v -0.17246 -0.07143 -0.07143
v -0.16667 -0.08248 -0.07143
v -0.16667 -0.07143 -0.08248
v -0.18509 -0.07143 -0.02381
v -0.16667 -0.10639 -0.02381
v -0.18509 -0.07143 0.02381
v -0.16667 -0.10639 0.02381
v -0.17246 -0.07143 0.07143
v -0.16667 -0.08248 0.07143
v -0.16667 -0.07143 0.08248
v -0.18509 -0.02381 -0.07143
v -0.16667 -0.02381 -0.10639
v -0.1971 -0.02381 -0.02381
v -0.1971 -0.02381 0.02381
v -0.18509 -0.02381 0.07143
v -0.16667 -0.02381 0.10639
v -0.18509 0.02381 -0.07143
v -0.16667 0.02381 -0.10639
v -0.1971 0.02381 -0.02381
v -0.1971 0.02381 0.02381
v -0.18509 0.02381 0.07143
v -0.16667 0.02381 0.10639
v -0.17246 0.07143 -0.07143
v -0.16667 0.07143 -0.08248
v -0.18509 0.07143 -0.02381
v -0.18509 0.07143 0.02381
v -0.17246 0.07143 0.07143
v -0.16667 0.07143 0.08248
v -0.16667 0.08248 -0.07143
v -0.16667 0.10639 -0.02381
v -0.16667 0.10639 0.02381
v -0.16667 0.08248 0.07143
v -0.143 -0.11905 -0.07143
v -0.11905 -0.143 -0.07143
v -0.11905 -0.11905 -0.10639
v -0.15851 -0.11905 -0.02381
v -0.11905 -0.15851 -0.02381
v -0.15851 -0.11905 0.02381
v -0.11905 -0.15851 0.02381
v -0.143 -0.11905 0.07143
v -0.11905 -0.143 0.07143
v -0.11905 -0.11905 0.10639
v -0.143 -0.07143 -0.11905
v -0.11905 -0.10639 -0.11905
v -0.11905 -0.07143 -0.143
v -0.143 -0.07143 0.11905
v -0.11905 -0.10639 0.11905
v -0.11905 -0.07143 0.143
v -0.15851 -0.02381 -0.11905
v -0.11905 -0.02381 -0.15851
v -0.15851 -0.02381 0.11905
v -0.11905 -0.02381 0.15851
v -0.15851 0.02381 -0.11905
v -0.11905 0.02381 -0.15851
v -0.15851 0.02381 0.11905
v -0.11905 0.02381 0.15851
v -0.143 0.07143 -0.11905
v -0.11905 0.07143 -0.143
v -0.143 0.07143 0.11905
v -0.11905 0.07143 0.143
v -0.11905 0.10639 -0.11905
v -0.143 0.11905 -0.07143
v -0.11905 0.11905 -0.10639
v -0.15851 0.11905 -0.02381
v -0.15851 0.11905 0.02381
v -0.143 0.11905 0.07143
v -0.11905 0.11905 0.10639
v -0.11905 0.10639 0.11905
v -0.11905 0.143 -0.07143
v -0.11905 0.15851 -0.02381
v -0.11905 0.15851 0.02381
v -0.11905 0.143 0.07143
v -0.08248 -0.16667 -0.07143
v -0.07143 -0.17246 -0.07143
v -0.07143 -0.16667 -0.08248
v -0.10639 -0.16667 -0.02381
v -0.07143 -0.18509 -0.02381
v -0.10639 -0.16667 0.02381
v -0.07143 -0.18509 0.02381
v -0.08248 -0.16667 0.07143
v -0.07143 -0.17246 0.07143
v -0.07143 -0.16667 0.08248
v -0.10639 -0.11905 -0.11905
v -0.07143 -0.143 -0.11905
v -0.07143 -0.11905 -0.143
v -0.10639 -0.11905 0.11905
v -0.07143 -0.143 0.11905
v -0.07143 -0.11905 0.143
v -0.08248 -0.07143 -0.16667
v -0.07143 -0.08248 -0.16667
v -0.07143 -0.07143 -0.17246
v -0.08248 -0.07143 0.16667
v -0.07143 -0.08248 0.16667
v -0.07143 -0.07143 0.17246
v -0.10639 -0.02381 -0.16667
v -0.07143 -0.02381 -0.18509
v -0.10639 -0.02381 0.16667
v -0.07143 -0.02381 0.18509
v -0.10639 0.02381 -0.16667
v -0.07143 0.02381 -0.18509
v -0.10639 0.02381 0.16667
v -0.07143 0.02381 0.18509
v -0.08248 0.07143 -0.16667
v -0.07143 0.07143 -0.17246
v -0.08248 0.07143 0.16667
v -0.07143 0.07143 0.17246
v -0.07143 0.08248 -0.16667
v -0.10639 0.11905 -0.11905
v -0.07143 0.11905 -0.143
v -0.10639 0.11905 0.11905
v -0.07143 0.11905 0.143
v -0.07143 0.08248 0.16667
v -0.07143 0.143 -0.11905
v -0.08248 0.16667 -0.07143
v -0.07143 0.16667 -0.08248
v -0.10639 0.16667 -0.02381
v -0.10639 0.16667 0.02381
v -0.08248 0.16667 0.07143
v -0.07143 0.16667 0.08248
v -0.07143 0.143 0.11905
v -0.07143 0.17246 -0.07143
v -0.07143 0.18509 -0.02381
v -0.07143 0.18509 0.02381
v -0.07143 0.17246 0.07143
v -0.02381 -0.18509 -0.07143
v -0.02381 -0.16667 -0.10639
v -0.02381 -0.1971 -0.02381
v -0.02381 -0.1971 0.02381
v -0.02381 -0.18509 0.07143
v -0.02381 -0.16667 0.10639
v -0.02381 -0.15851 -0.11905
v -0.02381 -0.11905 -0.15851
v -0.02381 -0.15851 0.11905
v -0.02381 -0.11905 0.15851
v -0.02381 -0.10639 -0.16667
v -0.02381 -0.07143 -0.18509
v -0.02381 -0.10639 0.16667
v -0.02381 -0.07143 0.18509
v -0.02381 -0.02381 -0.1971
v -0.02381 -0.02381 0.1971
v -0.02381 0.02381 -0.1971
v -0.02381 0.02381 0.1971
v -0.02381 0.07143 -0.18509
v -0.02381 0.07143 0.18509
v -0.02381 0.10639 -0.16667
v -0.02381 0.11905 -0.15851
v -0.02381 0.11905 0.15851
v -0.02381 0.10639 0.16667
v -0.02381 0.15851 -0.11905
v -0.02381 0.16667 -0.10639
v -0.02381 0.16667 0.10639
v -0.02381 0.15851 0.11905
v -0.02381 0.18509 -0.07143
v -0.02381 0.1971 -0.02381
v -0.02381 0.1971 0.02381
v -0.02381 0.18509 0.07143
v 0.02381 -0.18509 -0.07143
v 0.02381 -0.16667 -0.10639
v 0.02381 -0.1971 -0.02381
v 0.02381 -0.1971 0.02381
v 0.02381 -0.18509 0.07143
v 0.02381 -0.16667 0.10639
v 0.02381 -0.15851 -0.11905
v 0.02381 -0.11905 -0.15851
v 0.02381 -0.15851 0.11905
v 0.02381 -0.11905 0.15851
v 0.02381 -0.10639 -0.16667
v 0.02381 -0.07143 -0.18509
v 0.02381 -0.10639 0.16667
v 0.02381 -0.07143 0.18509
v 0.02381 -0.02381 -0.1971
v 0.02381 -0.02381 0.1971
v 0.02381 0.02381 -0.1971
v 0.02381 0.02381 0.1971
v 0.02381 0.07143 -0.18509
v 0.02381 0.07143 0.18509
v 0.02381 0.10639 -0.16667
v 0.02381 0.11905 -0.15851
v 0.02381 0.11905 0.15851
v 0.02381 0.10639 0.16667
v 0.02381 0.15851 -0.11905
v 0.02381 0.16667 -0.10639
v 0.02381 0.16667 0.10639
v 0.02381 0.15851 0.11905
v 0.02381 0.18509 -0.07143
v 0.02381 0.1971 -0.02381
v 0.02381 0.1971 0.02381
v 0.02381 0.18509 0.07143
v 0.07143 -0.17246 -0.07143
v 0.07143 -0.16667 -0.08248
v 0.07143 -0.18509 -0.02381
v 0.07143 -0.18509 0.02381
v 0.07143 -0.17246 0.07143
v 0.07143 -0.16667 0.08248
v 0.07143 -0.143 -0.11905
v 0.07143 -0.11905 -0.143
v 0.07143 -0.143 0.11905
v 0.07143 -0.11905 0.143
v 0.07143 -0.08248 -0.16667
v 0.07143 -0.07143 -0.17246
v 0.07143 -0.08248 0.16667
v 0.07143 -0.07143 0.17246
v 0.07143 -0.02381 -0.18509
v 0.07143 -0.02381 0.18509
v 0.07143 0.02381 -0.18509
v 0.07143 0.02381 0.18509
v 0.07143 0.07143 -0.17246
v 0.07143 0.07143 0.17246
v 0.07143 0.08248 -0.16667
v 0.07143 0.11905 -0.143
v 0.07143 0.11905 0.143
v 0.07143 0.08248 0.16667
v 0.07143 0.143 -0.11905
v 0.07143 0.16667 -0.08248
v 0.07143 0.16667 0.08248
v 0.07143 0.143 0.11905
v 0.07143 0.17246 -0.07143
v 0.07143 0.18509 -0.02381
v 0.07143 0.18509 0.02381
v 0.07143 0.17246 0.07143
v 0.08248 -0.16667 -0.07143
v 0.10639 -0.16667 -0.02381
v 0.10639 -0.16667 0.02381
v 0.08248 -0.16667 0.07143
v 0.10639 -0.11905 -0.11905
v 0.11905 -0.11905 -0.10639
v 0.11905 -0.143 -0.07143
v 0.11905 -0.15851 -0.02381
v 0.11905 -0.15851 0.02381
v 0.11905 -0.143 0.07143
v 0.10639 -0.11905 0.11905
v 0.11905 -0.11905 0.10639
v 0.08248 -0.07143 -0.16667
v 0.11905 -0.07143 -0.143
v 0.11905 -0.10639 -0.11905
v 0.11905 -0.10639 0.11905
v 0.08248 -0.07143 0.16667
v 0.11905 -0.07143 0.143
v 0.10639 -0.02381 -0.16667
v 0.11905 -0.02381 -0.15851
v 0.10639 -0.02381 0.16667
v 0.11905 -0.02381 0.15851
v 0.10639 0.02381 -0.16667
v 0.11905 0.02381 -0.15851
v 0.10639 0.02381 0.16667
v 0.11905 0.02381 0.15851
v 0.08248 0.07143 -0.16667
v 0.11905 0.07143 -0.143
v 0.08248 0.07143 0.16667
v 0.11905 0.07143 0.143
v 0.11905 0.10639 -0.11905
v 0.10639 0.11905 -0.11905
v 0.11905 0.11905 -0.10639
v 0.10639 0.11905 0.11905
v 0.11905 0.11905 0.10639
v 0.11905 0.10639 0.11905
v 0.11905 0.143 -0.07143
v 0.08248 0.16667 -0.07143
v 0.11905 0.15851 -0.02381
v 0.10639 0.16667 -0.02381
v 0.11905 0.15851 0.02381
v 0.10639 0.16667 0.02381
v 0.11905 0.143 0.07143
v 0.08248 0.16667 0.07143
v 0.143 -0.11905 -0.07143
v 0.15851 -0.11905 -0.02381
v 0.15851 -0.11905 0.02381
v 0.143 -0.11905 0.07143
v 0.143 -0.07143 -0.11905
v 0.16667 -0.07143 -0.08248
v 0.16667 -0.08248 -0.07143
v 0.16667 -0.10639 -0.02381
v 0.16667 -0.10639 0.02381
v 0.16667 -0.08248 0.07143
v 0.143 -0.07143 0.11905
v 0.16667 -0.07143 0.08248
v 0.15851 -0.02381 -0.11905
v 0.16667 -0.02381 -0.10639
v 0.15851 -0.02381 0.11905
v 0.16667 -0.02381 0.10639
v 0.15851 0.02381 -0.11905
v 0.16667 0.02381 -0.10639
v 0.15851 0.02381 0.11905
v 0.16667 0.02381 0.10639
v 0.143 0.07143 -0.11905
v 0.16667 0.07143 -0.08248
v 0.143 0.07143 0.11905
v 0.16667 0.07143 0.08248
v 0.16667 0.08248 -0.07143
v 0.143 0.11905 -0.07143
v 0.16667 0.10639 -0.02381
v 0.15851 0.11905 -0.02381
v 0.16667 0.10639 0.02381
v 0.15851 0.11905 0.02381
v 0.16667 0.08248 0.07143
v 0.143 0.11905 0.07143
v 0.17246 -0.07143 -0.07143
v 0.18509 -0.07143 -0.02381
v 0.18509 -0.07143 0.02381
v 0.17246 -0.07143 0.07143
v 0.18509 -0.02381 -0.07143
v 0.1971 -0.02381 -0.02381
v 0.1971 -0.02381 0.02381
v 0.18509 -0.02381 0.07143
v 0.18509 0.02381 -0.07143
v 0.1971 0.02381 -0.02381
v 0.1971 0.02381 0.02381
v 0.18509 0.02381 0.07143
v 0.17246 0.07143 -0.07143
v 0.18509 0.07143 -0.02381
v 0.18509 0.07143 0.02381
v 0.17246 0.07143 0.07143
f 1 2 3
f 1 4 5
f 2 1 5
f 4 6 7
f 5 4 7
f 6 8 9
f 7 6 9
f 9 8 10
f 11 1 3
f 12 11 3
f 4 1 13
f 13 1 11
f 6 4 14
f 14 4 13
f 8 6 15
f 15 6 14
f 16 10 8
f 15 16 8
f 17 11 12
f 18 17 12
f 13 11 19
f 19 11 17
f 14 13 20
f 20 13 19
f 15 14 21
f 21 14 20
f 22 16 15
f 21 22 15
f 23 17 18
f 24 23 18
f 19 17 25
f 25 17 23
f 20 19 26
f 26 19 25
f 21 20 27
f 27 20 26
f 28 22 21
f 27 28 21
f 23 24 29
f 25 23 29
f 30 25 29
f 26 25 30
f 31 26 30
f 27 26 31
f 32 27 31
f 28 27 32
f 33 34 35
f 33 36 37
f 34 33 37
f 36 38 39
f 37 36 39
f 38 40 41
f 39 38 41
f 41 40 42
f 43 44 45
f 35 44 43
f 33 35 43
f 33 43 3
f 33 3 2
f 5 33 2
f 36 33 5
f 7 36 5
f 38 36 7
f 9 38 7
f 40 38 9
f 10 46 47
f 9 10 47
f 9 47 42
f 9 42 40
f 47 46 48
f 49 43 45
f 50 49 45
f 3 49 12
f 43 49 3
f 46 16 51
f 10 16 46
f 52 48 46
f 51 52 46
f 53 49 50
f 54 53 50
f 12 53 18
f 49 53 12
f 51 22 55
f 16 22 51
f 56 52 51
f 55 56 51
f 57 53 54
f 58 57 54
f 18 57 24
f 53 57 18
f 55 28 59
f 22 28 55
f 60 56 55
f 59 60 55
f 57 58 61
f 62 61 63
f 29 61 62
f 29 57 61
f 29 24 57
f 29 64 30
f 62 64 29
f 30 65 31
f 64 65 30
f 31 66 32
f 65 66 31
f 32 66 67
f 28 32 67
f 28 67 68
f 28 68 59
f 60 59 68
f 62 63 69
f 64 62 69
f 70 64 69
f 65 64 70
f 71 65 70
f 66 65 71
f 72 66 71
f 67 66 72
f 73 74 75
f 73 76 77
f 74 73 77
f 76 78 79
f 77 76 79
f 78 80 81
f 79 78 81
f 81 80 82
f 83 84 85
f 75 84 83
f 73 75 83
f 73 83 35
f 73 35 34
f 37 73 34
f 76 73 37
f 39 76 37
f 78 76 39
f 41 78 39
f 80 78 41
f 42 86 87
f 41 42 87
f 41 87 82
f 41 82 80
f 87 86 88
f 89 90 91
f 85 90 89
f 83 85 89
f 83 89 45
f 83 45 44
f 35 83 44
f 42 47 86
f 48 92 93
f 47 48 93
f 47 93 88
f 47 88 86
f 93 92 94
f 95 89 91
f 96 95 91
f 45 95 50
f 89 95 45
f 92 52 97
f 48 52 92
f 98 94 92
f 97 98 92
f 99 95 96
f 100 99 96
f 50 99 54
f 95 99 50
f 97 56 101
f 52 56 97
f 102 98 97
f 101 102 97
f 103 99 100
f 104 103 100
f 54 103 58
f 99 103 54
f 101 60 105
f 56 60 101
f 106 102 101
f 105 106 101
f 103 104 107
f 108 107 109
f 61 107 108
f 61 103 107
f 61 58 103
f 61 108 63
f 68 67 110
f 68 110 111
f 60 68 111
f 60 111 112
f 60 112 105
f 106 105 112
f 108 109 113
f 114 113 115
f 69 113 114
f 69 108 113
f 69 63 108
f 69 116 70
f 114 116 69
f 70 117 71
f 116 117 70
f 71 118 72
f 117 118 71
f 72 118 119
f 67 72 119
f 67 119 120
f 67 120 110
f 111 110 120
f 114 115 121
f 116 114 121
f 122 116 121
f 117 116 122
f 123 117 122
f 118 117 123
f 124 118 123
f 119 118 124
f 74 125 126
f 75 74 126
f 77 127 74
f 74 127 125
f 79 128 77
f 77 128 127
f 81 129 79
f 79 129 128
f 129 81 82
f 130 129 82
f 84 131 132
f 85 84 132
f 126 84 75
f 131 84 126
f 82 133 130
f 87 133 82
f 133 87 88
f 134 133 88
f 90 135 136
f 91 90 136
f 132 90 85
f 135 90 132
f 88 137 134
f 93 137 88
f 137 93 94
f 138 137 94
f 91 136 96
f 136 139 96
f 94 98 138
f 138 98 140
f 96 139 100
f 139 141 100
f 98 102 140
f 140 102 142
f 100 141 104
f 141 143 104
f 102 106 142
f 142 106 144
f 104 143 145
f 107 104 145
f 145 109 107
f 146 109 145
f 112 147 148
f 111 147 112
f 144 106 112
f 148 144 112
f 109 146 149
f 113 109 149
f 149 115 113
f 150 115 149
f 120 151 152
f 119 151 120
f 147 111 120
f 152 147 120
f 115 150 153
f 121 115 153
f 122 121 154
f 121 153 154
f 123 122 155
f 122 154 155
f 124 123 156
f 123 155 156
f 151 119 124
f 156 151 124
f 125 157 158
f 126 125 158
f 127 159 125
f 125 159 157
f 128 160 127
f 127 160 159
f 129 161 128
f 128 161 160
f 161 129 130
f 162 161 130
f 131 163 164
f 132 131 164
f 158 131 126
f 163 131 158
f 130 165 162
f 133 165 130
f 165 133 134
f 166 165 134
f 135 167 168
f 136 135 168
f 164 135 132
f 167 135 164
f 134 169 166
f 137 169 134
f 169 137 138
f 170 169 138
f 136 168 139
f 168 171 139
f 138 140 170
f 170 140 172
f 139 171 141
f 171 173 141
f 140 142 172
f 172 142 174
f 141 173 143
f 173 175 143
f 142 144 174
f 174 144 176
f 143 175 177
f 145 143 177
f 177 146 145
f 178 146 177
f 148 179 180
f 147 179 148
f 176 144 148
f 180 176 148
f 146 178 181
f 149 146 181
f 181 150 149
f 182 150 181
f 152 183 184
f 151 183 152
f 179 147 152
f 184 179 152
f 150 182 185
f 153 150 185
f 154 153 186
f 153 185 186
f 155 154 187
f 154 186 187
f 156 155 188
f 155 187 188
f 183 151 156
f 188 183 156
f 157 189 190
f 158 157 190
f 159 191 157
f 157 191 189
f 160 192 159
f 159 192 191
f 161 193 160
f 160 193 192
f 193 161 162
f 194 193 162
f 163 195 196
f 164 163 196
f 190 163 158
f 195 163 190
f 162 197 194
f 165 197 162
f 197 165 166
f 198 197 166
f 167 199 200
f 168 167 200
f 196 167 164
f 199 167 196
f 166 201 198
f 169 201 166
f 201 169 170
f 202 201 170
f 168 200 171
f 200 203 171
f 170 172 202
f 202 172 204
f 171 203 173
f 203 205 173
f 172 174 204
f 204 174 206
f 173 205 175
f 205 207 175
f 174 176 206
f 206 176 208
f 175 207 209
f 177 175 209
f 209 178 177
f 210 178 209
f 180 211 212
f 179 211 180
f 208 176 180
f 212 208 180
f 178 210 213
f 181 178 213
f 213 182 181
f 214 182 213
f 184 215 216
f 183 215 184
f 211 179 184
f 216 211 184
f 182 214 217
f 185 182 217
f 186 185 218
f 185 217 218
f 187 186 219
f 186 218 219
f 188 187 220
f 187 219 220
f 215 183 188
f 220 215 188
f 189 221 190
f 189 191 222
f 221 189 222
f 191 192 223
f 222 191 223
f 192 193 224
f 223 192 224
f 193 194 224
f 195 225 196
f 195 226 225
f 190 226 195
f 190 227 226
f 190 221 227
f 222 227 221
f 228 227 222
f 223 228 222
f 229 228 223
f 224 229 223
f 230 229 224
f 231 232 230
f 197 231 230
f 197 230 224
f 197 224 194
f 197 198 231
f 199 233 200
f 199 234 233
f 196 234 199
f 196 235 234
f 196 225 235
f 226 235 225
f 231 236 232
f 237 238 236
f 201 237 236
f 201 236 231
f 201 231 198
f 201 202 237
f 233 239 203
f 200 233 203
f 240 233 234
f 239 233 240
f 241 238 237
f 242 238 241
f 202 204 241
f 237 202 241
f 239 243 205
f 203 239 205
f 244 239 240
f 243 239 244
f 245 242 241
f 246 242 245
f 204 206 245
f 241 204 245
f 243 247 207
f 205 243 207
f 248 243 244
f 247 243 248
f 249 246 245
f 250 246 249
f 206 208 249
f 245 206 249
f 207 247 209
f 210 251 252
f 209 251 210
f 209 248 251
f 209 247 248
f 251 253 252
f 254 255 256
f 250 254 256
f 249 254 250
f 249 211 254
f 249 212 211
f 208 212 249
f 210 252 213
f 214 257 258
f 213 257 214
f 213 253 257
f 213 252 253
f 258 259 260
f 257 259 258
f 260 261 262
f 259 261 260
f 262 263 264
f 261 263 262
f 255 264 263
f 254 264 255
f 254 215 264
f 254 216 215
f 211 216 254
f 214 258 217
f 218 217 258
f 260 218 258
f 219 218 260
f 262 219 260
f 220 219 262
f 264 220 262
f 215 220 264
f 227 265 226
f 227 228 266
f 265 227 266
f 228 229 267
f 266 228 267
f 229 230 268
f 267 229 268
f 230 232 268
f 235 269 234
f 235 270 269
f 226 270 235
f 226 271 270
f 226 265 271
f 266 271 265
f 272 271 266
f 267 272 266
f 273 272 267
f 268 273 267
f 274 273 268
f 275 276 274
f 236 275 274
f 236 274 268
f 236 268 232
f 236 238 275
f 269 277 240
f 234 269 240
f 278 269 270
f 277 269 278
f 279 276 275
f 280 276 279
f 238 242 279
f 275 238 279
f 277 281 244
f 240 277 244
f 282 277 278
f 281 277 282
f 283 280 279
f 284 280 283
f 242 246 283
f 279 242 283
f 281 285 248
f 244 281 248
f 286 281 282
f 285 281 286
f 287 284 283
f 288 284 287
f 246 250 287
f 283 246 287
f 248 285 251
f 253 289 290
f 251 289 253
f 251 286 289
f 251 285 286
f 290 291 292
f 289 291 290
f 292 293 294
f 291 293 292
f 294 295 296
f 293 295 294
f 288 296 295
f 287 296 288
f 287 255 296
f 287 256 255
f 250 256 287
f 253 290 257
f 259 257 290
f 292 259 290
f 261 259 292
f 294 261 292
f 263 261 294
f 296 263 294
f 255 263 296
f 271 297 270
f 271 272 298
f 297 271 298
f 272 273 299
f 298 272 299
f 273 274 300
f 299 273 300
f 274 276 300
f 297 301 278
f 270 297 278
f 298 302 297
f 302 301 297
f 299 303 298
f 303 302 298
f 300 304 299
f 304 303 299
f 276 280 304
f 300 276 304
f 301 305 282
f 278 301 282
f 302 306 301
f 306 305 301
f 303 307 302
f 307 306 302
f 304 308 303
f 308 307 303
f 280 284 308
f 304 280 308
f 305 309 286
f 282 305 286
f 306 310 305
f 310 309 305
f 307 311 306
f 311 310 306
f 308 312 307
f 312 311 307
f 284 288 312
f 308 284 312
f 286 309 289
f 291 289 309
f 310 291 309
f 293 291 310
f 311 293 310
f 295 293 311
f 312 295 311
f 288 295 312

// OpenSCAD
polyhedron(points=[
[-0.1724593752906436,-0.07142857142857162,-0.07142857142857162],
[-0.16666666666666674,-0.08247766040620363,-0.07142857142857162],
[-0.16666666666666674,-0.07142857142857162,-0.08247766040620363],
[-0.18508783976236987,-0.07142857142857162,-0.023809523809523947],
[-0.16666666666666674,-0.10639009021577395,-0.023809523809523947],
[-0.18508783976236987,-0.07142857142857162,0.023809523809523725],
[-0.16666666666666674,-0.10639009021577395,0.023809523809523725],
[-0.1724593752906436,-0.07142857142857162,0.0714285714285714],
[-0.16666666666666674,-0.08247766040620363,0.0714285714285714],
[-0.16666666666666674,-0.07142857142857162,0.08247756958007812],
[-0.18508783976236987,-0.023809523809523947,-0.07142857142857162],
[-0.16666666666666674,-0.023809523809523947,-0.10639009021577395],
[-0.1971043178013394,-0.023809523809523947,-0.023809523809523947],
[-0.1971043178013394,-0.023809523809523947,0.023809523809523725],
[-0.18508783976236987,-0.023809523809523947,0.0714285714285714],
[-0.16666666666666674,-0.023809523809523947,0.10639009021577372],
[-0.18508783976236987,0.023809523809523725,-0.07142857142857162],
[-0.16666666666666674,0.023809523809523725,-0.10639009021577395],
[-0.1971043178013394,0.023809523809523725,-0.023809523809523947],
[-0.1971043178013394,0.023809523809523725,0.023809523809523725],
[-0.18508783976236987,0.023809523809523725,0.0714285714285714],
[-0.16666666666666674,0.023809523809523725,0.10639009021577372],
[-0.1724593752906436,0.0714285714285714,-0.07142857142857162],
[-0.16666666666666674,0.0714285714285714,-0.08247766040620363],
[-0.18508783976236987,0.0714285714285714,-0.023809523809523947],
[-0.18508783976236987,0.0714285714285714,0.023809523809523725],
[-0.1724593752906436,0.0714285714285714,0.0714285714285714],
[-0.16666666666666674,0.0714285714285714,0.08247756958007812],
[-0.16666666666666674,0.08247756958007812,-0.07142857142857162],
[-0.16666666666666674,0.10639009021577372,-0.023809523809523947],
[-0.16666666666666674,0.10639009021577372,0.023809523809523725],
[-0.16666666666666674,0.08247756958007812,0.0714285714285714],
[-0.14299737839471738,-0.11904761904761907,-0.07142857142857162],
[-0.11904761904761907,-0.14299737839471738,-0.07142857142857162],
[-0.11904761904761907,-0.11904761904761907,-0.10639009021577395],
[-0.15850702921549487,-0.11904761904761907,-0.023809523809523947],
[-0.11904761904761907,-0.15850702921549487,-0.023809523809523947],
[-0.15850702921549487,-0.11904761904761907,0.023809523809523725],
[-0.11904761904761907,-0.15850702921549487,0.023809523809523725],
[-0.14299737839471738,-0.11904761904761907,0.0714285714285714],
[-0.11904761904761907,-0.14299737839471738,0.0714285714285714],
[-0.11904761904761907,-0.11904761904761907,0.10639009021577372],
[-0.14299737839471738,-0.07142857142857162,-0.11904761904761907],
[-0.11904761904761907,-0.10639009021577395,-0.11904761904761907],
[-0.11904761904761907,-0.07142857142857162,-0.14299737839471738],
[-0.14299737839471738,-0.07142857142857162,0.11904761904761907],
[-0.11904761904761907,-0.10639009021577395,0.11904761904761907],
[-0.11904761904761907,-0.07142857142857162,0.14299737839471716],
[-0.15850702921549487,-0.023809523809523947,-0.11904761904761907],
[-0.11904761904761907,-0.023809523809523947,-0.15850702921549487],
[-0.15850702921549487,-0.023809523809523947,0.11904761904761907],
[-0.11904761904761907,-0.023809523809523947,0.15850702921549464],
[-0.15850702921549487,0.023809523809523725,-0.11904761904761907],
[-0.11904761904761907,0.023809523809523725,-0.15850702921549487],
[-0.15850702921549487,0.023809523809523725,0.11904761904761907],
[-0.11904761904761907,0.023809523809523725,0.15850702921549464],
[-0.14299737839471738,0.0714285714285714,-0.11904761904761907],
[-0.11904761904761907,0.0714285714285714,-0.14299737839471738],
[-0.14299737839471738,0.0714285714285714,0.11904761904761907],
[-0.11904761904761907,0.0714285714285714,0.14299737839471716],
[-0.11904761904761907,0.10639009021577372,-0.11904761904761907],
[-0.14299737839471738,0.11904761904761907,-0.07142857142857162],
[-0.11904761904761907,0.11904761904761907,-0.10639009021577395],
[-0.15850702921549487,0.11904761904761907,-0.023809523809523947],
[-0.15850702921549487,0.11904761904761907,0.023809523809523725],
[-0.14299737839471738,0.11904761904761907,0.0714285714285714],
[-0.11904761904761907,0.11904761904761907,0.10639009021577372],
[-0.11904761904761907,0.10639009021577372,0.11904761904761907],
[-0.11904761904761907,0.14299737839471716,-0.07142857142857162],
[-0.11904761904761907,0.15850702921549464,-0.023809523809523947],
[-0.11904761904761907,0.15850702921549464,0.023809523809523725],
[-0.11904761904761907,0.14299737839471716,0.0714285714285714],
[-0.08247766040620363,-0.16666666666666674,-0.07142857142857162],
[-0.07142857142857162,-0.1724593752906436,-0.07142857142857162],
[-0.07142857142857162,-0.16666666666666674,-0.08247766040620363],
[-0.10639009021577395,-0.16666666666666674,-0.023809523809523947],
[-0.07142857142857162,-0.18508783976236987,-0.023809523809523947],
[-0.10639009021577395,-0.16666666666666674,0.023809523809523725],
[-0.07142857142857162,-0.18508783976236987,0.023809523809523725],
[-0.08247766040620363,-0.16666666666666674,0.0714285714285714],
[-0.07142857142857162,-0.1724593752906436,0.0714285714285714],
[-0.07142857142857162,-0.16666666666666674,0.08247756958007812],
[-0.10639009021577395,-0.11904761904761907,-0.11904761904761907],
[-0.07142857142857162,-0.14299737839471738,-0.11904761904761907],
[-0.07142857142857162,-0.11904761904761907,-0.14299737839471738],
[-0.10639009021577395,-0.11904761904761907,0.11904761904761907],
[-0.07142857142857162,-0.14299737839471738,0.11904761904761907],
[-0.07142857142857162,-0.11904761904761907,0.14299737839471716],
[-0.08247766040620363,-0.07142857142857162,-0.16666666666666674],
[-0.07142857142857162,-0.08247766040620363,-0.16666666666666674],
[-0.07142857142857162,-0.07142857142857162,-0.1724593752906436],
[-0.08247766040620363,-0.07142857142857162,0.16666666666666652],
[-0.07142857142857162,-0.08247766040620363,0.16666666666666652],
[-0.07142857142857162,-0.07142857142857162,0.1724593752906436],
[-0.10639009021577395,-0.023809523809523947,-0.16666666666666674],
[-0.07142857142857162,-0.023809523809523947,-0.18508783976236987],
[-0.10639009021577395,-0.023809523809523947,0.16666666666666652],
[-0.07142857142857162,-0.023809523809523947,0.18508783976236964],
[-0.10639009021577395,0.023809523809523725,-0.16666666666666674],
[-0.07142857142857162,0.023809523809523725,-0.18508783976236987],
[-0.10639009021577395,0.023809523809523725,0.16666666666666652],
[-0.07142857142857162,0.023809523809523725,0.18508783976236964],
[-0.08247766040620363,0.0714285714285714,-0.16666666666666674],
[-0.07142857142857162,0.0714285714285714,-0.1724593752906436],
[-0.08247766040620363,0.0714285714285714,0.16666666666666652],
[-0.07142857142857162,0.0714285714285714,0.1724593752906436],
[-0.07142857142857162,0.08247756958007812,-0.16666666666666674],
[-0.10639009021577395,0.11904761904761907,-0.11904761904761907],
[-0.07142857142857162,0.11904761904761907,-0.14299737839471738],
[-0.10639009021577395,0.11904761904761907,0.11904761904761907],
[-0.07142857142857162,0.11904761904761907,0.14299737839471716],
[-0.07142857142857162,0.08247756958007812,0.16666666666666652],
[-0.07142857142857162,0.14299737839471716,-0.11904761904761907],
[-0.08247766040620363,0.16666666666666652,-0.07142857142857162],
[-0.07142857142857162,0.16666666666666652,-0.08247766040620363],
[-0.10639009021577395,0.16666666666666652,-0.023809523809523947],
[-0.10639009021577395,0.16666666666666652,0.023809523809523725],
[-0.08247766040620363,0.16666666666666652,0.0714285714285714],
[-0.07142857142857162,0.16666666666666652,0.08247756958007812],
[-0.07142857142857162,0.14299737839471716,0.11904761904761907],
[-0.07142857142857162,0.1724593752906436,-0.07142857142857162],
[-0.07142857142857162,0.18508783976236964,-0.023809523809523947],
[-0.07142857142857162,0.18508783976236964,0.023809523809523725],
[-0.07142857142857162,0.1724593752906436,0.0714285714285714],
[-0.023809523809523947,-0.18508783976236987,-0.07142857142857162],
[-0.023809523809523947,-0.16666666666666674,-0.10639009021577395],
[-0.023809523809523947,-0.1971043178013394,-0.023809523809523947],
[-0.023809523809523947,-0.1971043178013394,0.023809523809523725],
[-0.023809523809523947,-0.18508783976236987,0.0714285714285714],
[-0.023809523809523947,-0.16666666666666674,0.10639009021577372],
[-0.023809523809523947,-0.15850702921549487,-0.11904761904761907],
[-0.023809523809523947,-0.11904761904761907,-0.15850702921549487],
[-0.023809523809523947,-0.15850702921549487,0.11904761904761907],
[-0.023809523809523947,-0.11904761904761907,0.15850702921549464],
[-0.023809523809523947,-0.10639009021577395,-0.16666666666666674],
[-0.023809523809523947,-0.07142857142857162,-0.18508783976236987],
[-0.023809523809523947,-0.10639009021577395,0.16666666666666652],
[-0.023809523809523947,-0.07142857142857162,0.18508783976236964],
[-0.023809523809523947,-0.023809523809523947,-0.1971043178013394],
[-0.023809523809523947,-0.023809523809523947,0.1971043178013392],
[-0.023809523809523947,0.023809523809523725,-0.1971043178013394],
[-0.023809523809523947,0.023809523809523725,0.1971043178013392],
[-0.023809523809523947,0.0714285714285714,-0.18508783976236987],
[-0.023809523809523947,0.0714285714285714,0.18508783976236964],
[-0.023809523809523947,0.10639009021577372,-0.16666666666666674],
[-0.023809523809523947,0.11904761904761907,-0.15850702921549487],
[-0.023809523809523947,0.11904761904761907,0.15850702921549464],
[-0.023809523809523947,0.10639009021577372,0.16666666666666652],
[-0.023809523809523947,0.15850702921549464,-0.11904761904761907],
[-0.023809523809523947,0.16666666666666652,-0.10639009021577395],
[-0.023809523809523947,0.16666666666666652,0.10639009021577372],
[-0.023809523809523947,0.15850702921549464,0.11904761904761907],
[-0.023809523809523947,0.18508783976236964,-0.07142857142857162],
[-0.023809523809523947,0.1971043178013392,-0.023809523809523947],
[-0.023809523809523947,0.1971043178013392,0.023809523809523725],
[-0.023809523809523947,0.18508783976236964,0.0714285714285714],
[0.023809523809523725,-0.18508783976236987,-0.07142857142857162],
[0.023809523809523725,-0.16666666666666674,-0.10639009021577395],
[0.023809523809523725,-0.1971043178013394,-0.023809523809523947],
[0.023809523809523725,-0.1971043178013394,0.023809523809523725],
[0.023809523809523725,-0.18508783976236987,0.0714285714285714],
[0.023809523809523725,-0.16666666666666674,0.10639009021577372],
[0.023809523809523725,-0.15850702921549487,-0.11904761904761907],
[0.023809523809523725,-0.11904761904761907,-0.15850702921549487],
[0.023809523809523725,-0.15850702921549487,0.11904761904761907],
[0.023809523809523725,-0.11904761904761907,0.15850702921549464],
[0.023809523809523725,-0.10639009021577395,-0.16666666666666674],
[0.023809523809523725,-0.07142857142857162,-0.18508783976236987],
[0.023809523809523725,-0.10639009021577395,0.16666666666666652],
[0.023809523809523725,-0.07142857142857162,0.18508783976236964],
[0.023809523809523725,-0.023809523809523947,-0.1971043178013394],
[0.023809523809523725,-0.023809523809523947,0.1971043178013392],
[0.023809523809523725,0.023809523809523725,-0.1971043178013394],
[0.023809523809523725,0.023809523809523725,0.1971043178013392],
[0.023809523809523725,0.0714285714285714,-0.18508783976236987],
[0.023809523809523725,0.0714285714285714,0.18508783976236964],
[0.023809523809523725,0.10639009021577372,-0.16666666666666674],
[0.023809523809523725,0.11904761904761907,-0.15850702921549487],
[0.023809523809523725,0.11904761904761907,0.15850702921549464],
[0.023809523809523725,0.10639009021577372,0.16666666666666652],
[0.023809523809523725,0.15850702921549464,-0.11904761904761907],
[0.023809523809523725,0.16666666666666652,-0.10639009021577395],
[0.023809523809523725,0.16666666666666652,0.10639009021577372],
[0.023809523809523725,0.15850702921549464,0.11904761904761907],
[0.023809523809523725,0.18508783976236964,-0.07142857142857162],
[0.023809523809523725,0.1971043178013392,-0.023809523809523947],
[0.023809523809523725,0.1971043178013392,0.023809523809523725],
[0.023809523809523725,0.18508783976236964,0.0714285714285714],
[0.0714285714285714,-0.1724593752906436,-0.07142857142857162],
[0.0714285714285714,-0.16666666666666674,-0.08247766040620363],
[0.0714285714285714,-0.18508783976236987,-0.023809523809523947],
[0.0714285714285714,-0.18508783976236987,0.023809523809523725],
[0.0714285714285714,-0.1724593752906436,0.0714285714285714],
[0.0714285714285714,-0.16666666666666674,0.08247756958007812],
[0.0714285714285714,-0.14299737839471738,-0.11904761904761907],
[0.0714285714285714,-0.11904761904761907,-0.14299737839471738],
[0.0714285714285714,-0.14299737839471738,0.11904761904761907],
[0.0714285714285714,-0.11904761904761907,0.14299737839471716],
[0.0714285714285714,-0.08247766040620363,-0.16666666666666674],
[0.0714285714285714,-0.07142857142857162,-0.1724593752906436],
[0.0714285714285714,-0.08247766040620363,0.16666666666666652],
[0.0714285714285714,-0.07142857142857162,0.1724593752906436],
[0.0714285714285714,-0.023809523809523947,-0.18508783976236987],
[0.0714285714285714,-0.023809523809523947,0.18508783976236964],
[0.0714285714285714,0.023809523809523725,-0.18508783976236987],
[0.0714285714285714,0.023809523809523725,0.18508783976236964],
[0.0714285714285714,0.0714285714285714,-0.1724593752906436],
[0.0714285714285714,0.0714285714285714,0.1724593752906436],
[0.0714285714285714,0.08247756958007812,-0.16666666666666674],
[0.0714285714285714,0.11904761904761907,-0.14299737839471738],
[0.0714285714285714,0.11904761904761907,0.14299737839471716],
[0.0714285714285714,0.08247756958007812,0.16666666666666652],
[0.0714285714285714,0.14299737839471716,-0.11904761904761907],
[0.0714285714285714,0.16666666666666652,-0.08247766040620363],
[0.0714285714285714,0.16666666666666652,0.08247756958007812],
[0.0714285714285714,0.14299737839471716,0.11904761904761907],
[0.0714285714285714,0.1724593752906436,-0.07142857142857162],
[0.0714285714285714,0.18508783976236964,-0.023809523809523947],
[0.0714285714285714,0.18508783976236964,0.023809523809523725],
[0.0714285714285714,0.1724593752906436,0.0714285714285714],
[0.08247756958007812,-0.16666666666666674,-0.07142857142857162],
[0.10639009021577372,-0.16666666666666674,-0.023809523809523947],
[0.10639009021577372,-0.16666666666666674,0.023809523809523725],
[0.08247756958007812,-0.16666666666666674,0.0714285714285714],
[0.10639009021577372,-0.11904761904761907,-0.11904761904761907],
[0.11904761904761907,-0.11904761904761907,-0.10639009021577395],
[0.11904761904761907,-0.14299737839471738,-0.07142857142857162],
[0.11904761904761907,-0.15850702921549487,-0.023809523809523947],
[0.11904761904761907,-0.15850702921549487,0.023809523809523725],
[0.11904761904761907,-0.14299737839471738,0.0714285714285714],
[0.10639009021577372,-0.11904761904761907,0.11904761904761907],
[0.11904761904761907,-0.11904761904761907,0.10639009021577372],
[0.08247756958007812,-0.07142857142857162,-0.16666666666666674],
[0.11904761904761907,-0.07142857142857162,-0.14299737839471738],
[0.11904761904761907,-0.10639009021577395,-0.11904761904761907],
[0.11904761904761907,-0.10639009021577395,0.11904761904761907],
[0.08247756958007812,-0.07142857142857162,0.16666666666666652],
[0.11904761904761907,-0.07142857142857162,0.14299737839471716],
[0.10639009021577372,-0.023809523809523947,-0.16666666666666674],
[0.11904761904761907,-0.023809523809523947,-0.15850702921549487],
[0.10639009021577372,-0.023809523809523947,0.16666666666666652],
[0.11904761904761907,-0.023809523809523947,0.15850702921549464],
[0.10639009021577372,0.023809523809523725,-0.16666666666666674],
[0.11904761904761907,0.023809523809523725,-0.15850702921549487],
[0.10639009021577372,0.023809523809523725,0.16666666666666652],
[0.11904761904761907,0.023809523809523725,0.15850702921549464],
[0.08247756958007812,0.0714285714285714,-0.16666666666666674],
[0.11904761904761907,0.0714285714285714,-0.14299737839471738],
[0.08247756958007812,0.0714285714285714,0.16666666666666652],
[0.11904761904761907,0.0714285714285714,0.14299737839471716],
[0.11904761904761907,0.10639009021577372,-0.11904761904761907],
[0.10639009021577372,0.11904761904761907,-0.11904761904761907],
[0.11904761904761907,0.11904761904761907,-0.10639009021577395],
[0.10639009021577372,0.11904761904761907,0.11904761904761907],
[0.11904761904761907,0.11904761904761907,0.10639009021577372],
[0.11904761904761907,0.10639009021577372,0.11904761904761907],
[0.11904761904761907,0.14299737839471716,-0.07142857142857162],
[0.08247756958007812,0.16666666666666652,-0.07142857142857162],
[0.11904761904761907,0.15850702921549464,-0.023809523809523947],
[0.10639009021577372,0.16666666666666652,-0.023809523809523947],
[0.11904761904761907,0.15850702921549464,0.023809523809523725],
[0.10639009021577372,0.16666666666666652,0.023809523809523725],
[0.11904761904761907,0.14299737839471716,0.0714285714285714],
[0.08247756958007812,0.16666666666666652,0.0714285714285714],
[0.14299737839471716,-0.11904761904761907,-0.07142857142857162],
[0.15850702921549464,-0.11904761904761907,-0.023809523809523947],
[0.15850702921549464,-0.11904761904761907,0.023809523809523725],
[0.14299737839471716,-0.11904761904761907,0.0714285714285714],
[0.14299737839471716,-0.07142857142857162,-0.11904761904761907],
[0.16666666666666652,-0.07142857142857162,-0.08247766040620363],
[0.16666666666666652,-0.08247766040620363,-0.07142857142857162],
[0.16666666666666652,-0.10639009021577395,-0.023809523809523947],
[0.16666666666666652,-0.10639009021577395,0.023809523809523725],
[0.16666666666666652,-0.08247766040620363,0.0714285714285714],
[0.14299737839471716,-0.07142857142857162,0.11904761904761907],
[0.16666666666666652,-0.07142857142857162,0.08247756958007812],
[0.15850702921549464,-0.023809523809523947,-0.11904761904761907],
[0.16666666666666652,-0.023809523809523947,-0.10639009021577395],
[0.15850702921549464,-0.023809523809523947,0.11904761904761907],
[0.16666666666666652,-0.023809523809523947,0.10639009021577372],
[0.15850702921549464,0.023809523809523725,-0.11904761904761907],
[0.16666666666666652,0.023809523809523725,-0.10639009021577395],
[0.15850702921549464,0.023809523809523725,0.11904761904761907],
[0.16666666666666652,0.023809523809523725,0.10639009021577372],
[0.14299737839471716,0.0714285714285714,-0.11904761904761907],
[0.16666666666666652,0.0714285714285714,-0.08247766040620363],
[0.14299737839471716,0.0714285714285714,0.11904761904761907],
[0.16666666666666652,0.0714285714285714,0.08247756958007812],
[0.16666666666666652,0.08247756958007812,-0.07142857142857162],
[0.14299737839471716,0.11904761904761907,-0.07142857142857162],
[0.16666666666666652,0.10639009021577372,-0.023809523809523947],
[0.15850702921549464,0.11904761904761907,-0.023809523809523947],
[0.16666666666666652,0.10639009021577372,0.023809523809523725],
[0.15850702921549464,0.11904761904761907,0.023809523809523725],
[0.16666666666666652,0.08247756958007812,0.0714285714285714],
[0.14299737839471716,0.11904761904761907,0.0714285714285714],
[0.1724593752906436,-0.07142857142857162,-0.07142857142857162],
[0.18508783976236964,-0.07142857142857162,-0.023809523809523947],
[0.18508783976236964,-0.07142857142857162,0.023809523809523725],
[0.1724593752906436,-0.07142857142857162,0.0714285714285714],
[0.18508783976236964,-0.023809523809523947,-0.07142857142857162],
[0.1971043178013392,-0.023809523809523947,-0.023809523809523947],
[0.1971043178013392,-0.023809523809523947,0.023809523809523725],
[0.18508783976236964,-0.023809523809523947,0.0714285714285714],
[0.18508783976236964,0.023809523809523725,-0.07142857142857162],
[0.1971043178013392,0.023809523809523725,-0.023809523809523947],
[0.1971043178013392,0.023809523809523725,0.023809523809523725],
[0.18508783976236964,0.023809523809523725,0.0714285714285714],
[0.1724593752906436,0.0714285714285714,-0.07142857142857162],
[0.18508783976236964,0.0714285714285714,-0.023809523809523947],
[0.18508783976236964,0.0714285714285714,0.023809523809523725],
[0.1724593752906436,0.0714285714285714,0.0714285714285714],
], faces=[
[2,1,0],
[4,3,0],
[4,0,1],
[6,5,3],
[6,3,4],
[8,7,5],
[8,5,6],
[9,7,8],
[2,0,10],
[2,10,11],
[12,0,3],
[10,0,12],
[13,3,5],
[12,3,13],
[14,5,7],
[13,5,14],
[7,9,15],
[7,15,14],
[11,10,16],
[11,16,17],
[18,10,12],
[16,10,18],
[19,12,13],
[18,12,19],
[20,13,14],
[19,13,20],
[14,15,21],
[14,21,20],
[17,16,22],
[17,22,23],
[24,16,18],
[22,16,24],
[25,18,19],
[24,18,25],
[26,19,20],
[25,19,26],
[20,21,27],
[20,27,26],
[28,23,22],
[28,22,24],
[28,24,29],
[29,24,25],
[29,25,30],
[30,25,26],
[30,26,31],
[31,26,27],
[34,33,32],
[36,35,32],
[36,32,33],
[38,37,35],
[38,35,36],
[40,39,37],
[40,37,38],
[41,39,40],
[44,43,42],
[42,43,34],
[42,34,32],
[2,42,32],
[1,2,32],
[1,32,4],
[4,32,35],
[4,35,6],
[6,35,37],
[6,37,8],
[8,37,39],
[46,45,9],
[46,9,8],
[41,46,8],
[39,41,8],
[47,45,46],
[44,42,48],
[44,48,49],
[11,48,2],
[2,48,42],
[50,15,45],
[45,15,9],
[45,47,51],
[45,51,50],
[49,48,52],
[49,52,53],
[17,52,11],
[11,52,48],
[54,21,50],
[50,21,15],
[50,51,55],
[50,55,54],
[53,52,56],
[53,56,57],
[23,56,17],
[17,56,52],
[58,27,54],
[54,27,21],
[54,55,59],
[54,59,58],
[60,57,56],
[62,60,61],
[61,60,28],
[60,56,28],
[56,23,28],
[29,63,28],
[28,63,61],
[30,64,29],
[29,64,63],
[31,65,30],
[30,65,64],
[66,65,31],
[66,31,27],
[67,66,27],
[58,67,27],
[67,58,59],
[68,62,61],
[68,61,63],
[68,63,69],
[69,63,64],
[69,64,70],
[70,64,65],
[70,65,71],
[71,65,66],
[74,73,72],
[76,75,72],
[76,72,73],
[78,77,75],
[78,75,76],
[80,79,77],
[80,77,78],
[81,79,80],
[84,83,82],
[82,83,74],
[82,74,72],
[34,82,72],
[33,34,72],
[33,72,36],
[36,72,75],
[36,75,38],
[38,75,77],
[38,77,40],
[40,77,79],
[86,85,41],
[86,41,40],
[81,86,40],
[79,81,40],
[87,85,86],
[90,89,88],
[88,89,84],
[88,84,82],
[44,88,82],
[43,44,82],
[43,82,34],
[85,46,41],
[92,91,47],
[92,47,46],
[87,92,46],
[85,87,46],
[93,91,92],
[90,88,94],
[90,94,95],
[49,94,44],
[44,94,88],
[96,51,91],
[91,51,47],
[91,93,97],
[91,97,96],
[95,94,98],
[95,98,99],
[53,98,49],
[49,98,94],
[100,55,96],
[96,55,51],
[96,97,101],
[96,101,100],
[99,98,102],
[99,102,103],
[57,102,53],
[53,102,98],
[104,59,100],
[100,59,55],
[100,101,105],
[100,105,104],
[106,103,102],
[108,106,107],
[107,106,60],
[106,102,60],
[102,57,60],
[62,107,60],
[109,66,67],
[110,109,67],
[110,67,59],
[111,110,59],
[104,111,59],
[111,104,105],
[112,108,107],
[114,112,113],
[113,112,68],
[112,107,68],
[107,62,68],
[69,115,68],
[68,115,113],
[70,116,69],
[69,116,115],
[71,117,70],
[70,117,116],
[118,117,71],
[118,71,66],
[119,118,66],
[109,119,66],
[119,109,110],
[120,114,113],
[120,113,115],
[120,115,121],
[121,115,116],
[121,116,122],
[122,116,117],
[122,117,123],
[123,117,118],
[125,124,73],
[125,73,74],
[73,126,76],
[124,126,73],
[76,127,78],
[126,127,76],
[78,128,80],
[127,128,78],
[81,80,128],
[81,128,129],
[131,130,83],
[131,83,84],
[74,83,125],
[125,83,130],
[129,132,81],
[81,132,86],
[87,86,132],
[87,132,133],
[135,134,89],
[135,89,90],
[84,89,131],
[131,89,134],
[133,136,87],
[87,136,92],
[93,92,136],
[93,136,137],
[95,135,90],
[95,138,135],
[137,97,93],
[139,97,137],
[99,138,95],
[99,140,138],
[139,101,97],
[141,101,139],
[103,140,99],
[103,142,140],
[141,105,101],
[143,105,141],
[144,142,103],
[144,103,106],
[106,108,144],
[144,108,145],
[147,146,111],
[111,146,110],
[111,105,143],
[111,143,147],
[148,145,108],
[148,108,112],
[112,114,148],
[148,114,149],
[151,150,119],
[119,150,118],
[119,110,146],
[119,146,151],
[152,149,114],
[152,114,120],
[153,120,121],
[153,152,120],
[154,121,122],
[154,153,121],
[155,122,123],
[155,154,122],
[123,118,150],
[123,150,155],
[157,156,124],
[157,124,125],
[124,158,126],
[156,158,124],
[126,159,127],
[158,159,126],
[127,160,128],
[159,160,127],
[129,128,160],
[129,160,161],
[163,162,130],
[163,130,131],
[125,130,157],
[157,130,162],
[161,164,129],
[129,164,132],
[133,132,164],
[133,164,165],
[167,166,134],
[167,134,135],
[131,134,163],
[163,134,166],
[165,168,133],
[133,168,136],
[137,136,168],
[137,168,169],
[138,167,135],
[138,170,167],
[169,139,137],
[171,139,169],
[140,170,138],
[140,172,170],
[171,141,139],
[173,141,171],
[142,172,140],
[142,174,172],
[173,143,141],
[175,143,173],
[176,174,142],
[176,142,144],
[144,145,176],
[176,145,177],
[179,178,147],
[147,178,146],
[147,143,175],
[147,175,179],
[180,177,145],
[180,145,148],
[148,149,180],
[180,149,181],
[183,182,151],
[151,182,150],
[151,146,178],
[151,178,183],
[184,181,149],
[184,149,152],
[185,152,153],
[185,184,152],
[186,153,154],
[186,185,153],
[187,154,155],
[187,186,154],
[155,150,182],
[155,182,187],
[189,188,156],
[189,156,157],
[156,190,158],
[188,190,156],
[158,191,159],
[190,191,158],
[159,192,160],
[191,192,159],
[161,160,192],
[161,192,193],
[195,194,162],
[195,162,163],
[157,162,189],
[189,162,194],
[193,196,161],
[161,196,164],
[165,164,196],
[165,196,197],
[199,198,166],
[199,166,167],
[163,166,195],
[195,166,198],
[197,200,165],
[165,200,168],
[169,168,200],
[169,200,201],
[170,199,167],
[170,202,199],
[201,171,169],
[203,171,201],
[172,202,170],
[172,204,202],
[203,173,171],
[205,173,203],
[174,204,172],
[174,206,204],
[205,175,173],
[207,175,205],
[208,206,174],
[208,174,176],
[176,177,208],
[208,177,209],
[211,210,179],
[179,210,178],
[179,175,207],
[179,207,211],
[212,209,177],
[212,177,180],
[180,181,212],
[212,181,213],
[215,214,183],
[183,214,182],
[183,178,210],
[183,210,215],
[216,213,181],
[216,181,184],
[217,184,185],
[217,216,184],
[218,185,186],
[218,217,185],
[219,186,187],
[219,218,186],
[187,182,214],
[187,214,219],
[189,220,188],
[221,190,188],
[221,188,220],
[222,191,190],
[222,190,221],
[223,192,191],
[223,191,222],
[223,193,192],
[195,224,194],
[224,225,194],
[194,225,189],
[225,226,189],
[226,220,189],
[220,226,221],
[221,226,227],
[221,227,222],
[222,227,228],
[222,228,223],
[223,228,229],
[229,231,230],
[229,230,196],
[223,229,196],
[193,223,196],
[230,197,196],
[199,232,198],
[232,233,198],
[198,233,195],
[233,234,195],
[234,224,195],
[224,234,225],
[231,235,230],
[235,237,236],
[235,236,200],
[230,235,200],
[197,230,200],
[236,201,200],
[202,238,232],
[202,232,199],
[233,232,239],
[239,232,238],
[236,237,240],
[240,237,241],
[240,203,201],
[240,201,236],
[204,242,238],
[204,238,202],
[239,238,243],
[243,238,242],
[240,241,244],
[244,241,245],
[244,205,203],
[244,203,240],
[206,246,242],
[206,242,204],
[243,242,247],
[247,242,246],
[244,245,248],
[248,245,249],
[248,207,205],
[248,205,244],
[208,246,206],
[251,250,209],
[209,250,208],
[250,247,208],
[247,246,208],
[251,252,250],
[255,254,253],
[255,253,249],
[249,253,248],
[253,210,248],
[210,211,248],
[248,211,207],
[212,251,209],
[257,256,213],
[213,256,212],
[256,252,212],
[252,251,212],
[259,258,257],
[257,258,256],
[261,260,259],
[259,260,258],
[263,262,261],
[261,262,260],
[262,263,254],
[254,263,253],
[263,214,253],
[214,215,253],
[253,215,210],
[216,257,213],
[257,216,217],
[257,217,259],
[259,217,218],
[259,218,261],
[261,218,219],
[261,219,263],
[263,219,214],
[225,264,226],
[265,227,226],
[265,226,264],
[266,228,227],
[266,227,265],
[267,229,228],
[267,228,266],
[267,231,229],
[233,268,234],
[268,269,234],
[234,269,225],
[269,270,225],
[270,264,225],
[264,270,265],
[265,270,271],
[265,271,266],
[266,271,272],
[266,272,267],
[267,272,273],
[273,275,274],
[273,274,235],
[267,273,235],
[231,267,235],
[274,237,235],
[239,276,268],
[239,268,233],
[269,268,277],
[277,268,276],
[274,275,278],
[278,275,279],
[278,241,237],
[278,237,274],
[243,280,276],
[243,276,239],
[277,276,281],
[281,276,280],
[278,279,282],
[282,279,283],
[282,245,241],
[282,241,278],
[247,284,280],
[247,280,243],
[281,280,285],
[285,280,284],
[282,283,286],
[286,283,287],
[286,249,245],
[286,245,282],
[250,284,247],
[289,288,252],
[252,288,250],
[288,285,250],
[285,284,250],
[291,290,289],
[289,290,288],
[293,292,291],
[291,292,290],
[295,294,293],
[293,294,292],
[294,295,287],
[287,295,286],
[295,254,286],
[254,255,286],
[286,255,249],
[256,289,252],
[289,256,258],
[289,258,291],
[291,258,260],
[291,260,293],
[293,260,262],
[293,262,295],
[295,262,254],
[269,296,270],
[297,271,270],
[297,270,296],
[298,272,271],
[298,271,297],
[299,273,272],
[299,272,298],
[299,275,273],
[277,300,296],
[277,296,269],
[296,301,297],
[296,300,301],
[297,302,298],
[297,301,302],
[298,303,299],
[298,302,303],
[303,279,275],
[303,275,299],
[281,304,300],
[281,300,277],
[300,305,301],
[300,304,305],
[301,306,302],
[301,305,306],
[302,307,303],
[302,306,307],
[307,283,279],
[307,279,303],
[285,308,304],
[285,304,281],
[304,309,305],
[304,308,309],
[305,310,306],
[305,309,310],
[306,311,307],
[306,310,311],
[311,287,283],
[311,283,307],
[288,308,285],
[308,288,290],
[308,290,309],
[309,290,292],
[309,292,310],
[310,292,294],
[310,294,311],
[311,294,287],
]);
